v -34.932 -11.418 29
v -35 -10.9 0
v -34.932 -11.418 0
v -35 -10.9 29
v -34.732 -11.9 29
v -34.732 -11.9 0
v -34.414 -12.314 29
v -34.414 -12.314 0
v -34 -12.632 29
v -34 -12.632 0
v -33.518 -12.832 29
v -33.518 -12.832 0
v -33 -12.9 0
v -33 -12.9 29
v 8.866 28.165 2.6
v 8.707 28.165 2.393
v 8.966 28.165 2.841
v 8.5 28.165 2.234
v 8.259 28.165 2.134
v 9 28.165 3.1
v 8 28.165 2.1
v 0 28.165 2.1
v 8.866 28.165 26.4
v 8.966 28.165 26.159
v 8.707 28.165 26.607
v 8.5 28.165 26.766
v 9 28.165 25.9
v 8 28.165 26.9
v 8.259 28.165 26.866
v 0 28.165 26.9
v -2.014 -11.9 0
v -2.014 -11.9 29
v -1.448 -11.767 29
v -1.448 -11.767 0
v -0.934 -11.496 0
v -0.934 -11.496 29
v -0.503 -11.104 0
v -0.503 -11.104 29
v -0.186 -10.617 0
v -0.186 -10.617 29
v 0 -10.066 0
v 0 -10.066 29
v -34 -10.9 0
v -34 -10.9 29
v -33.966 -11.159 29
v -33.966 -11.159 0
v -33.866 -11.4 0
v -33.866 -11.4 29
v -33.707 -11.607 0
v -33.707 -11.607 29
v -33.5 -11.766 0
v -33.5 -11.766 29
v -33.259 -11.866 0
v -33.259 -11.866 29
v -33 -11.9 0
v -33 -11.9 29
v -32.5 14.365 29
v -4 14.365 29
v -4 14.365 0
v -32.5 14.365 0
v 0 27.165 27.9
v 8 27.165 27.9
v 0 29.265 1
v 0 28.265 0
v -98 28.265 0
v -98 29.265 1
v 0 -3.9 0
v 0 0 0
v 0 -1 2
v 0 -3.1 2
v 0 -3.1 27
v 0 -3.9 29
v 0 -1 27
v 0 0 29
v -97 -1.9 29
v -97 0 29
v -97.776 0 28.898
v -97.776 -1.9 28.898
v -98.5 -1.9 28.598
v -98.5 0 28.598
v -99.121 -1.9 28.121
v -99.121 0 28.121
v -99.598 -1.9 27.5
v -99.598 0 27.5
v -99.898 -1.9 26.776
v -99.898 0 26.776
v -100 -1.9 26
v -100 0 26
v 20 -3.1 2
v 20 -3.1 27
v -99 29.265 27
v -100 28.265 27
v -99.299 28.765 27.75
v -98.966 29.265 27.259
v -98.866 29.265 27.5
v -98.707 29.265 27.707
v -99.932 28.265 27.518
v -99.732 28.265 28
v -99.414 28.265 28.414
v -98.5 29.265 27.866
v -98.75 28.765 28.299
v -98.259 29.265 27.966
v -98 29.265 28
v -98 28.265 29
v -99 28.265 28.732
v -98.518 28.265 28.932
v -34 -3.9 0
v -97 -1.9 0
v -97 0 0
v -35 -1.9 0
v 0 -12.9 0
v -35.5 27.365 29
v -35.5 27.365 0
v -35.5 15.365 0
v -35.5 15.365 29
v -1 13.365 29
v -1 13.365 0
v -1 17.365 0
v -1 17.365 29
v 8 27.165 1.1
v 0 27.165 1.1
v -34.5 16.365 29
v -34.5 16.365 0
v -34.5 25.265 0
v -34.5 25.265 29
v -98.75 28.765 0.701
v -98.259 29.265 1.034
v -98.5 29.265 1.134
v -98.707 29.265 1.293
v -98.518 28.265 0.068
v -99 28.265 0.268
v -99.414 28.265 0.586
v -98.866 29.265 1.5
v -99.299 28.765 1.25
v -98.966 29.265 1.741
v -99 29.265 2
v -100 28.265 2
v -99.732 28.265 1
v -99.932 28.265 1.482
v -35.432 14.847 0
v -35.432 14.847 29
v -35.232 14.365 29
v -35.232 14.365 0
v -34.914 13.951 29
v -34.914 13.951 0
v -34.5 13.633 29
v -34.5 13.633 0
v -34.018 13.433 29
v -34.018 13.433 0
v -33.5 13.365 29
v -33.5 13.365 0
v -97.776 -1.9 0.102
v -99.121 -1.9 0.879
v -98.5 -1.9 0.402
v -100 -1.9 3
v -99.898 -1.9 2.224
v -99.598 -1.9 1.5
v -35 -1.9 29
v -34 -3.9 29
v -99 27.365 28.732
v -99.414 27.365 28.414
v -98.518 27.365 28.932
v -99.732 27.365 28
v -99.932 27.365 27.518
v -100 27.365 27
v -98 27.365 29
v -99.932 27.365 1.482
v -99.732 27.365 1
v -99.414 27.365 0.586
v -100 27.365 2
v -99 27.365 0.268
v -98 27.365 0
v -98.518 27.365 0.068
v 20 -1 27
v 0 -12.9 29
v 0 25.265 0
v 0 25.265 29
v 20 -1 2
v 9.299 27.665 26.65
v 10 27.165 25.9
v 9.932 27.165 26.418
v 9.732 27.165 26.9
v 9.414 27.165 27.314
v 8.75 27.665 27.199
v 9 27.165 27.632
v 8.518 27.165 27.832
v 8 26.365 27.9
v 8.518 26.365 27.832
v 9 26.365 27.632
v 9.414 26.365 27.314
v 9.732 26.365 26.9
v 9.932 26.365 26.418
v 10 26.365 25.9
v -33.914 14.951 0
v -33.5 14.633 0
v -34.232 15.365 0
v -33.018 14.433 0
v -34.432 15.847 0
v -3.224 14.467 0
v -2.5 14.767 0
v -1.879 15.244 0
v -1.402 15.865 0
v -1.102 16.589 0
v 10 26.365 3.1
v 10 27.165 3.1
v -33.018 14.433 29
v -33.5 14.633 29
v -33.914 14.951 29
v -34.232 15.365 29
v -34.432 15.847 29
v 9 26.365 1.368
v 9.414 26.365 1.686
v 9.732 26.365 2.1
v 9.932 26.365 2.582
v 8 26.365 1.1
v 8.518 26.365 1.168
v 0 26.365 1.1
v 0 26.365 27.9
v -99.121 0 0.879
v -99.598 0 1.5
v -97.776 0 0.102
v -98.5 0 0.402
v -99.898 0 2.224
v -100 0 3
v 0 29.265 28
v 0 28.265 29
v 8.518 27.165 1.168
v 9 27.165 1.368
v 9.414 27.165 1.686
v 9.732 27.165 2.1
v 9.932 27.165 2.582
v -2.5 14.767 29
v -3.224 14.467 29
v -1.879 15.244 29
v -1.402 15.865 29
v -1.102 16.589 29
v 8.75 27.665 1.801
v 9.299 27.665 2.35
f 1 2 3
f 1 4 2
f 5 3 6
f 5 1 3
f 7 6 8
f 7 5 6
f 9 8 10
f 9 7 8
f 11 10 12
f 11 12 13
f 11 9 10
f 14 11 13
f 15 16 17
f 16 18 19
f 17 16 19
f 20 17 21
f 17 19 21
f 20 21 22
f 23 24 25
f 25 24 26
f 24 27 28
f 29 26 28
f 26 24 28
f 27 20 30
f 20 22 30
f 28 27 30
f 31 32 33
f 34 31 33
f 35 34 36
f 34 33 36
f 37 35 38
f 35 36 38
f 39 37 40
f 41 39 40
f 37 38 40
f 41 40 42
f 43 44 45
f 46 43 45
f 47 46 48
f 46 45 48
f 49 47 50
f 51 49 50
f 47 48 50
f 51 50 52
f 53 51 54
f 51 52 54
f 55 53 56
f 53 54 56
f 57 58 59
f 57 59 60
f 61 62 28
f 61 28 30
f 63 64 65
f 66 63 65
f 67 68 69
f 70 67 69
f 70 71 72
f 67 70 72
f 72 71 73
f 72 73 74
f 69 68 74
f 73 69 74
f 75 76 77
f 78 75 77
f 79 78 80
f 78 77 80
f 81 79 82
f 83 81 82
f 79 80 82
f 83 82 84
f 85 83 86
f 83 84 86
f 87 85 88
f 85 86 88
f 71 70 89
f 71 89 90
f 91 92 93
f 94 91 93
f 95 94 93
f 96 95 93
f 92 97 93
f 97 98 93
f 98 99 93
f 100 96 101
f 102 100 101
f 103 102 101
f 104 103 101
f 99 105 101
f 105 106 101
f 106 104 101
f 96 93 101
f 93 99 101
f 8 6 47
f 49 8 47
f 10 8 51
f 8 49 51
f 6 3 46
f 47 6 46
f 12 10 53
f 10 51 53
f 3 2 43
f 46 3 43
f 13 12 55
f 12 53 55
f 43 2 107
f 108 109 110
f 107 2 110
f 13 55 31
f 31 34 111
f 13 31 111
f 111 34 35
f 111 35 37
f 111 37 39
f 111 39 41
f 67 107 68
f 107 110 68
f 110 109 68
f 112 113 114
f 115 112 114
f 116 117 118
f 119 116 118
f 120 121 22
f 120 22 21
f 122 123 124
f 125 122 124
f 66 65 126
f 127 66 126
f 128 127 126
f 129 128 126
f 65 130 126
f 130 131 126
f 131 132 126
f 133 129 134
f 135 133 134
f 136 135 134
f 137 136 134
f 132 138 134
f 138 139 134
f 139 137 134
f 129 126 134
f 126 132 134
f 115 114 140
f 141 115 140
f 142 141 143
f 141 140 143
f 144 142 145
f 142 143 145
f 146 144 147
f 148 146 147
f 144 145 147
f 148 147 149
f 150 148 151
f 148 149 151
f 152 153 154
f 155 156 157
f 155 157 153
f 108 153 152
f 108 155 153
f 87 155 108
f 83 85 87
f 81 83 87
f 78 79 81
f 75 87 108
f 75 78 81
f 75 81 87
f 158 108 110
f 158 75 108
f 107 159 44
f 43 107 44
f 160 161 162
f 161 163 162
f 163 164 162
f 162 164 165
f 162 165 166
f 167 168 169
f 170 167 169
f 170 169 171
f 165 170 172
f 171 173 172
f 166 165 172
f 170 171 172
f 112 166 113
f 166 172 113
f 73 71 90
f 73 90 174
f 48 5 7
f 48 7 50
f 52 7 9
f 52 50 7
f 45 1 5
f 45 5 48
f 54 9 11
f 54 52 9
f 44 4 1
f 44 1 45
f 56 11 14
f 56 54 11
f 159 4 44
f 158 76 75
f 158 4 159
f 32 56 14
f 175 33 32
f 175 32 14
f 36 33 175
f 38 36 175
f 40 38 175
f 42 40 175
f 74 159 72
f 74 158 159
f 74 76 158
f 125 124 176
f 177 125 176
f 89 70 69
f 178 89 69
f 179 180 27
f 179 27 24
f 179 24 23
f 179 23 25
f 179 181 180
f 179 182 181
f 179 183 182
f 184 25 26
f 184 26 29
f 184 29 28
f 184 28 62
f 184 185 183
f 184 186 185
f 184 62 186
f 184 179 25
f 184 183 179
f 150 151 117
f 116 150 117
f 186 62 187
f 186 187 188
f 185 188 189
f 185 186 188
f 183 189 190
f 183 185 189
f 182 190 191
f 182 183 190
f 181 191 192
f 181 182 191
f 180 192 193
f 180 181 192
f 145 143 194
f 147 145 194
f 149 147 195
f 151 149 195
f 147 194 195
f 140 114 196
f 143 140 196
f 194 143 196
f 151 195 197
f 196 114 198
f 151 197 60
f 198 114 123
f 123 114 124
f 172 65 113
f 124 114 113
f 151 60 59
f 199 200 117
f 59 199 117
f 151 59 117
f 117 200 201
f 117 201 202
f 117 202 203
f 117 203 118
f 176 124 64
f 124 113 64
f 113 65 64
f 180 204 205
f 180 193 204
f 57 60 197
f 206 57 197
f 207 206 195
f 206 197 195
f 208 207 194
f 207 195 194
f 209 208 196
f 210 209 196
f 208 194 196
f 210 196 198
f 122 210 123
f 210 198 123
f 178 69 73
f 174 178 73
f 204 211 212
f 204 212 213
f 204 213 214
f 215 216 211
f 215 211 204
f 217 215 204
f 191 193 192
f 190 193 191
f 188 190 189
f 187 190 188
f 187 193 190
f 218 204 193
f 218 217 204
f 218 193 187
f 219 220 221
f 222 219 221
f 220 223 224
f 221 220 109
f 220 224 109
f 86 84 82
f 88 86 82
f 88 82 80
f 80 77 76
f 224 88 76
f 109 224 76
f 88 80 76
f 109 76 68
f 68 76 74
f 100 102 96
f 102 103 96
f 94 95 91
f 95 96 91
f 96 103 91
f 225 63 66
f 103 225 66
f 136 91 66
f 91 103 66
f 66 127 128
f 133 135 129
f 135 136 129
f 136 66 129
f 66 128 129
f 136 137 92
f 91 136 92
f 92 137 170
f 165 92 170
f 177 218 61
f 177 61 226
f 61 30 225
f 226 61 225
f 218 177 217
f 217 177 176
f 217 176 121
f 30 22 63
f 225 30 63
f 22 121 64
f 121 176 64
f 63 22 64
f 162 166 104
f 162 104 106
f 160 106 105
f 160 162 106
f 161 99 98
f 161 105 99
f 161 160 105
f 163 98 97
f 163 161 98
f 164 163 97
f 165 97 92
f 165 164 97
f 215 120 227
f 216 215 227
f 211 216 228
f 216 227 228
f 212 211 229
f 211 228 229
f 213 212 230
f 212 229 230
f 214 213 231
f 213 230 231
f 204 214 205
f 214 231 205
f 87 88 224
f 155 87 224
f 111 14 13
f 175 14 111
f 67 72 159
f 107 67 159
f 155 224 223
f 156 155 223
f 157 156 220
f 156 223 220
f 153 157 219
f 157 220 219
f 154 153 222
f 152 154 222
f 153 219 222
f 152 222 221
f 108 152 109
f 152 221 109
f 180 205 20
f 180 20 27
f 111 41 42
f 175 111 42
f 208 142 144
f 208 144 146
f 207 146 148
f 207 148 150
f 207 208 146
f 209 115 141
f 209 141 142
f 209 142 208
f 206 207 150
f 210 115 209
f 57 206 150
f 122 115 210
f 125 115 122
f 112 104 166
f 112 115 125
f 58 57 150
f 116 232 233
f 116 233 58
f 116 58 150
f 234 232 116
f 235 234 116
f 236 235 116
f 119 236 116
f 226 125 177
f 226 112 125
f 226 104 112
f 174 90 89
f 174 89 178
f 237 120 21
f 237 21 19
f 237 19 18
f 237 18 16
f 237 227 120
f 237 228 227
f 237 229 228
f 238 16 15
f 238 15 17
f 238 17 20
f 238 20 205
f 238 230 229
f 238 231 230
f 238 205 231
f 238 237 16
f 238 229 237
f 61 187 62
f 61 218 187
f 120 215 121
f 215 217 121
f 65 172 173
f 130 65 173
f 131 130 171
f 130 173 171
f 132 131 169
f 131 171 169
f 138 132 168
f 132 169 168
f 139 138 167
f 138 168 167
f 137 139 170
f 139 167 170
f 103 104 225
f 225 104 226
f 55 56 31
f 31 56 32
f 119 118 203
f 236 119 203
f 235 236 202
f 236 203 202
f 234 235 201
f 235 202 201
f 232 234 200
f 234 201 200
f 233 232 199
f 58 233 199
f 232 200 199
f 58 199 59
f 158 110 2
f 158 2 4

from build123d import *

# Parameters (mm, degrees)
F1_DEPTH  = 1.9
F0_W      = 35
F0_H      = 29
F2_DEPTH  = 12.9
F3_W      = 2.1
F3_H      = 25
F4_DEPTH  = 20
F5_R      = 2
F7_DEPTH  = 29
F9_DEPTH  = 29
F10_W     = 1.8
F10_H     = 26.8
F11_DEPTH = 10
F12_R     = 2
F13_SIZE  = 1
F14_SIZE  = 1


with BuildPart() as f1:
    # F0 (on Front) → F1 (new body)
    with BuildSketch(Plane.XZ):
        with BuildLine():
            Line((-97, 0), (-35, 0))
            Line((-35, 0), (-35, 29))
            Line((-35, 29), (-97, 29))
            ThreePointArc((-97, 29), (-99.12132, 28.12132), (-100, 26))
            Line((-100, 26), (-100, 3))
            ThreePointArc((-100, 3), (-99.12132, 0.87868), (-97, 0))
        make_face()
    extrude(amount=F1_DEPTH)

    # F0 (on Front) → F2 (join)
    with BuildSketch(Plane.XZ):
        with Locations((-17.5, 14.5)):
            Rectangle(F0_W, F0_H)
    extrude(amount=F2_DEPTH)

    # F3 (on face) → F4 (join)
    with BuildSketch(Plane.YZ):
        with Locations((-2.05, 14.5)):
            Rectangle(F3_W, F3_H)
    extrude(amount=F4_DEPTH)

    # F5
    f5_edges = [f1.edges().sort_by_distance(p)[0] for p in [
        (-35, -12.9, 14.5),
    ]]
    fillet(f5_edges, radius=F5_R)

    # F6 (on face) → F7 (cut)
    with BuildSketch(Plane.XY.offset(29)):
        with BuildLine():
            Line((-34.000002, -3.9), (-34.000002, -10.9))
            ThreePointArc((-34.000002, -10.9), (-33.707108, -11.607108), (-33, -11.900002))
            Line((-33, -11.900002), (-2.492048, -11.900002))
            Line((-2.492048, -11.900002), (-2.014314, -11.900002))
            ThreePointArc((-2.014314, -11.900002), (-0.706069, -11.313625), (0, -10.065902))
            Line((0, -10.065902), (0, -9.163091))
            Line((0, -9.163091), (0, -3.9))
            Line((0, -3.9), (-34.000002, -3.9))
        make_face()
    extrude(amount=-F7_DEPTH, mode=Mode.SUBTRACT)


with BuildPart() as f9:
    # F8 (on Top) → F9 (new body)
    with BuildSketch(Plane.XY):
        with BuildLine():
            Line((0, 25.265098), (0, 29.265098))
            Line((0, 29.265098), (-100, 29.265098))
            Line((-100, 29.265098), (-100, 27.365098))
            Line((-100, 27.365098), (-35.5, 27.365098))
            Line((-35.5, 27.365098), (-35.5, 15.365098))
            ThreePointArc((-35.5, 15.365098), (-34.914214, 13.950884), (-33.5, 13.365098))
            Line((-33.5, 13.365098), (-1, 13.365098))
            Line((-1, 13.365098), (-1, 17.365098))
            ThreePointArc((-1, 17.365098), (-1.87868, 15.243777), (-4, 14.365098))
            Line((-4, 14.365098), (-32.5, 14.365098))
            ThreePointArc((-32.5, 14.365098), (-33.914214, 14.950884), (-34.5, 16.365098))
            Line((-34.5, 16.365098), (-34.5, 25.265098))
            Line((-34.5, 25.265098), (0, 25.265098))
        make_face()
    extrude(amount=F9_DEPTH)

    # F10 (on face) → F11 (join)
    with BuildSketch(Plane.YZ):
        with Locations((27.265098, 14.5)):
            Rectangle(F10_W, F10_H)
    extrude(amount=F11_DEPTH)

    # F12
    f12_edges = [f9.edges().sort_by_distance(p)[0] for p in [
        (10, 27.265098, 27.9),
        (10, 27.265098, 1.1),
        (-100, 28.315098, 29),
        (-100, 28.315098, 0),
    ]]
    fillet(f12_edges, radius=F12_R)

    # F13
    f13_edges = [f9.edges().sort_by_distance(p)[0] for p in [
        (10, 28.165098, 14.5),
    ]]
    chamfer(f13_edges, length=F13_SIZE)

    # F14
    f14_edges = [f9.edges().sort_by_distance(p)[0] for p in [
        (-100, 29.265098, 14.5),
    ]]
    chamfer(f14_edges, length=F14_SIZE)


solid = Compound([f1.part, f9.part])
